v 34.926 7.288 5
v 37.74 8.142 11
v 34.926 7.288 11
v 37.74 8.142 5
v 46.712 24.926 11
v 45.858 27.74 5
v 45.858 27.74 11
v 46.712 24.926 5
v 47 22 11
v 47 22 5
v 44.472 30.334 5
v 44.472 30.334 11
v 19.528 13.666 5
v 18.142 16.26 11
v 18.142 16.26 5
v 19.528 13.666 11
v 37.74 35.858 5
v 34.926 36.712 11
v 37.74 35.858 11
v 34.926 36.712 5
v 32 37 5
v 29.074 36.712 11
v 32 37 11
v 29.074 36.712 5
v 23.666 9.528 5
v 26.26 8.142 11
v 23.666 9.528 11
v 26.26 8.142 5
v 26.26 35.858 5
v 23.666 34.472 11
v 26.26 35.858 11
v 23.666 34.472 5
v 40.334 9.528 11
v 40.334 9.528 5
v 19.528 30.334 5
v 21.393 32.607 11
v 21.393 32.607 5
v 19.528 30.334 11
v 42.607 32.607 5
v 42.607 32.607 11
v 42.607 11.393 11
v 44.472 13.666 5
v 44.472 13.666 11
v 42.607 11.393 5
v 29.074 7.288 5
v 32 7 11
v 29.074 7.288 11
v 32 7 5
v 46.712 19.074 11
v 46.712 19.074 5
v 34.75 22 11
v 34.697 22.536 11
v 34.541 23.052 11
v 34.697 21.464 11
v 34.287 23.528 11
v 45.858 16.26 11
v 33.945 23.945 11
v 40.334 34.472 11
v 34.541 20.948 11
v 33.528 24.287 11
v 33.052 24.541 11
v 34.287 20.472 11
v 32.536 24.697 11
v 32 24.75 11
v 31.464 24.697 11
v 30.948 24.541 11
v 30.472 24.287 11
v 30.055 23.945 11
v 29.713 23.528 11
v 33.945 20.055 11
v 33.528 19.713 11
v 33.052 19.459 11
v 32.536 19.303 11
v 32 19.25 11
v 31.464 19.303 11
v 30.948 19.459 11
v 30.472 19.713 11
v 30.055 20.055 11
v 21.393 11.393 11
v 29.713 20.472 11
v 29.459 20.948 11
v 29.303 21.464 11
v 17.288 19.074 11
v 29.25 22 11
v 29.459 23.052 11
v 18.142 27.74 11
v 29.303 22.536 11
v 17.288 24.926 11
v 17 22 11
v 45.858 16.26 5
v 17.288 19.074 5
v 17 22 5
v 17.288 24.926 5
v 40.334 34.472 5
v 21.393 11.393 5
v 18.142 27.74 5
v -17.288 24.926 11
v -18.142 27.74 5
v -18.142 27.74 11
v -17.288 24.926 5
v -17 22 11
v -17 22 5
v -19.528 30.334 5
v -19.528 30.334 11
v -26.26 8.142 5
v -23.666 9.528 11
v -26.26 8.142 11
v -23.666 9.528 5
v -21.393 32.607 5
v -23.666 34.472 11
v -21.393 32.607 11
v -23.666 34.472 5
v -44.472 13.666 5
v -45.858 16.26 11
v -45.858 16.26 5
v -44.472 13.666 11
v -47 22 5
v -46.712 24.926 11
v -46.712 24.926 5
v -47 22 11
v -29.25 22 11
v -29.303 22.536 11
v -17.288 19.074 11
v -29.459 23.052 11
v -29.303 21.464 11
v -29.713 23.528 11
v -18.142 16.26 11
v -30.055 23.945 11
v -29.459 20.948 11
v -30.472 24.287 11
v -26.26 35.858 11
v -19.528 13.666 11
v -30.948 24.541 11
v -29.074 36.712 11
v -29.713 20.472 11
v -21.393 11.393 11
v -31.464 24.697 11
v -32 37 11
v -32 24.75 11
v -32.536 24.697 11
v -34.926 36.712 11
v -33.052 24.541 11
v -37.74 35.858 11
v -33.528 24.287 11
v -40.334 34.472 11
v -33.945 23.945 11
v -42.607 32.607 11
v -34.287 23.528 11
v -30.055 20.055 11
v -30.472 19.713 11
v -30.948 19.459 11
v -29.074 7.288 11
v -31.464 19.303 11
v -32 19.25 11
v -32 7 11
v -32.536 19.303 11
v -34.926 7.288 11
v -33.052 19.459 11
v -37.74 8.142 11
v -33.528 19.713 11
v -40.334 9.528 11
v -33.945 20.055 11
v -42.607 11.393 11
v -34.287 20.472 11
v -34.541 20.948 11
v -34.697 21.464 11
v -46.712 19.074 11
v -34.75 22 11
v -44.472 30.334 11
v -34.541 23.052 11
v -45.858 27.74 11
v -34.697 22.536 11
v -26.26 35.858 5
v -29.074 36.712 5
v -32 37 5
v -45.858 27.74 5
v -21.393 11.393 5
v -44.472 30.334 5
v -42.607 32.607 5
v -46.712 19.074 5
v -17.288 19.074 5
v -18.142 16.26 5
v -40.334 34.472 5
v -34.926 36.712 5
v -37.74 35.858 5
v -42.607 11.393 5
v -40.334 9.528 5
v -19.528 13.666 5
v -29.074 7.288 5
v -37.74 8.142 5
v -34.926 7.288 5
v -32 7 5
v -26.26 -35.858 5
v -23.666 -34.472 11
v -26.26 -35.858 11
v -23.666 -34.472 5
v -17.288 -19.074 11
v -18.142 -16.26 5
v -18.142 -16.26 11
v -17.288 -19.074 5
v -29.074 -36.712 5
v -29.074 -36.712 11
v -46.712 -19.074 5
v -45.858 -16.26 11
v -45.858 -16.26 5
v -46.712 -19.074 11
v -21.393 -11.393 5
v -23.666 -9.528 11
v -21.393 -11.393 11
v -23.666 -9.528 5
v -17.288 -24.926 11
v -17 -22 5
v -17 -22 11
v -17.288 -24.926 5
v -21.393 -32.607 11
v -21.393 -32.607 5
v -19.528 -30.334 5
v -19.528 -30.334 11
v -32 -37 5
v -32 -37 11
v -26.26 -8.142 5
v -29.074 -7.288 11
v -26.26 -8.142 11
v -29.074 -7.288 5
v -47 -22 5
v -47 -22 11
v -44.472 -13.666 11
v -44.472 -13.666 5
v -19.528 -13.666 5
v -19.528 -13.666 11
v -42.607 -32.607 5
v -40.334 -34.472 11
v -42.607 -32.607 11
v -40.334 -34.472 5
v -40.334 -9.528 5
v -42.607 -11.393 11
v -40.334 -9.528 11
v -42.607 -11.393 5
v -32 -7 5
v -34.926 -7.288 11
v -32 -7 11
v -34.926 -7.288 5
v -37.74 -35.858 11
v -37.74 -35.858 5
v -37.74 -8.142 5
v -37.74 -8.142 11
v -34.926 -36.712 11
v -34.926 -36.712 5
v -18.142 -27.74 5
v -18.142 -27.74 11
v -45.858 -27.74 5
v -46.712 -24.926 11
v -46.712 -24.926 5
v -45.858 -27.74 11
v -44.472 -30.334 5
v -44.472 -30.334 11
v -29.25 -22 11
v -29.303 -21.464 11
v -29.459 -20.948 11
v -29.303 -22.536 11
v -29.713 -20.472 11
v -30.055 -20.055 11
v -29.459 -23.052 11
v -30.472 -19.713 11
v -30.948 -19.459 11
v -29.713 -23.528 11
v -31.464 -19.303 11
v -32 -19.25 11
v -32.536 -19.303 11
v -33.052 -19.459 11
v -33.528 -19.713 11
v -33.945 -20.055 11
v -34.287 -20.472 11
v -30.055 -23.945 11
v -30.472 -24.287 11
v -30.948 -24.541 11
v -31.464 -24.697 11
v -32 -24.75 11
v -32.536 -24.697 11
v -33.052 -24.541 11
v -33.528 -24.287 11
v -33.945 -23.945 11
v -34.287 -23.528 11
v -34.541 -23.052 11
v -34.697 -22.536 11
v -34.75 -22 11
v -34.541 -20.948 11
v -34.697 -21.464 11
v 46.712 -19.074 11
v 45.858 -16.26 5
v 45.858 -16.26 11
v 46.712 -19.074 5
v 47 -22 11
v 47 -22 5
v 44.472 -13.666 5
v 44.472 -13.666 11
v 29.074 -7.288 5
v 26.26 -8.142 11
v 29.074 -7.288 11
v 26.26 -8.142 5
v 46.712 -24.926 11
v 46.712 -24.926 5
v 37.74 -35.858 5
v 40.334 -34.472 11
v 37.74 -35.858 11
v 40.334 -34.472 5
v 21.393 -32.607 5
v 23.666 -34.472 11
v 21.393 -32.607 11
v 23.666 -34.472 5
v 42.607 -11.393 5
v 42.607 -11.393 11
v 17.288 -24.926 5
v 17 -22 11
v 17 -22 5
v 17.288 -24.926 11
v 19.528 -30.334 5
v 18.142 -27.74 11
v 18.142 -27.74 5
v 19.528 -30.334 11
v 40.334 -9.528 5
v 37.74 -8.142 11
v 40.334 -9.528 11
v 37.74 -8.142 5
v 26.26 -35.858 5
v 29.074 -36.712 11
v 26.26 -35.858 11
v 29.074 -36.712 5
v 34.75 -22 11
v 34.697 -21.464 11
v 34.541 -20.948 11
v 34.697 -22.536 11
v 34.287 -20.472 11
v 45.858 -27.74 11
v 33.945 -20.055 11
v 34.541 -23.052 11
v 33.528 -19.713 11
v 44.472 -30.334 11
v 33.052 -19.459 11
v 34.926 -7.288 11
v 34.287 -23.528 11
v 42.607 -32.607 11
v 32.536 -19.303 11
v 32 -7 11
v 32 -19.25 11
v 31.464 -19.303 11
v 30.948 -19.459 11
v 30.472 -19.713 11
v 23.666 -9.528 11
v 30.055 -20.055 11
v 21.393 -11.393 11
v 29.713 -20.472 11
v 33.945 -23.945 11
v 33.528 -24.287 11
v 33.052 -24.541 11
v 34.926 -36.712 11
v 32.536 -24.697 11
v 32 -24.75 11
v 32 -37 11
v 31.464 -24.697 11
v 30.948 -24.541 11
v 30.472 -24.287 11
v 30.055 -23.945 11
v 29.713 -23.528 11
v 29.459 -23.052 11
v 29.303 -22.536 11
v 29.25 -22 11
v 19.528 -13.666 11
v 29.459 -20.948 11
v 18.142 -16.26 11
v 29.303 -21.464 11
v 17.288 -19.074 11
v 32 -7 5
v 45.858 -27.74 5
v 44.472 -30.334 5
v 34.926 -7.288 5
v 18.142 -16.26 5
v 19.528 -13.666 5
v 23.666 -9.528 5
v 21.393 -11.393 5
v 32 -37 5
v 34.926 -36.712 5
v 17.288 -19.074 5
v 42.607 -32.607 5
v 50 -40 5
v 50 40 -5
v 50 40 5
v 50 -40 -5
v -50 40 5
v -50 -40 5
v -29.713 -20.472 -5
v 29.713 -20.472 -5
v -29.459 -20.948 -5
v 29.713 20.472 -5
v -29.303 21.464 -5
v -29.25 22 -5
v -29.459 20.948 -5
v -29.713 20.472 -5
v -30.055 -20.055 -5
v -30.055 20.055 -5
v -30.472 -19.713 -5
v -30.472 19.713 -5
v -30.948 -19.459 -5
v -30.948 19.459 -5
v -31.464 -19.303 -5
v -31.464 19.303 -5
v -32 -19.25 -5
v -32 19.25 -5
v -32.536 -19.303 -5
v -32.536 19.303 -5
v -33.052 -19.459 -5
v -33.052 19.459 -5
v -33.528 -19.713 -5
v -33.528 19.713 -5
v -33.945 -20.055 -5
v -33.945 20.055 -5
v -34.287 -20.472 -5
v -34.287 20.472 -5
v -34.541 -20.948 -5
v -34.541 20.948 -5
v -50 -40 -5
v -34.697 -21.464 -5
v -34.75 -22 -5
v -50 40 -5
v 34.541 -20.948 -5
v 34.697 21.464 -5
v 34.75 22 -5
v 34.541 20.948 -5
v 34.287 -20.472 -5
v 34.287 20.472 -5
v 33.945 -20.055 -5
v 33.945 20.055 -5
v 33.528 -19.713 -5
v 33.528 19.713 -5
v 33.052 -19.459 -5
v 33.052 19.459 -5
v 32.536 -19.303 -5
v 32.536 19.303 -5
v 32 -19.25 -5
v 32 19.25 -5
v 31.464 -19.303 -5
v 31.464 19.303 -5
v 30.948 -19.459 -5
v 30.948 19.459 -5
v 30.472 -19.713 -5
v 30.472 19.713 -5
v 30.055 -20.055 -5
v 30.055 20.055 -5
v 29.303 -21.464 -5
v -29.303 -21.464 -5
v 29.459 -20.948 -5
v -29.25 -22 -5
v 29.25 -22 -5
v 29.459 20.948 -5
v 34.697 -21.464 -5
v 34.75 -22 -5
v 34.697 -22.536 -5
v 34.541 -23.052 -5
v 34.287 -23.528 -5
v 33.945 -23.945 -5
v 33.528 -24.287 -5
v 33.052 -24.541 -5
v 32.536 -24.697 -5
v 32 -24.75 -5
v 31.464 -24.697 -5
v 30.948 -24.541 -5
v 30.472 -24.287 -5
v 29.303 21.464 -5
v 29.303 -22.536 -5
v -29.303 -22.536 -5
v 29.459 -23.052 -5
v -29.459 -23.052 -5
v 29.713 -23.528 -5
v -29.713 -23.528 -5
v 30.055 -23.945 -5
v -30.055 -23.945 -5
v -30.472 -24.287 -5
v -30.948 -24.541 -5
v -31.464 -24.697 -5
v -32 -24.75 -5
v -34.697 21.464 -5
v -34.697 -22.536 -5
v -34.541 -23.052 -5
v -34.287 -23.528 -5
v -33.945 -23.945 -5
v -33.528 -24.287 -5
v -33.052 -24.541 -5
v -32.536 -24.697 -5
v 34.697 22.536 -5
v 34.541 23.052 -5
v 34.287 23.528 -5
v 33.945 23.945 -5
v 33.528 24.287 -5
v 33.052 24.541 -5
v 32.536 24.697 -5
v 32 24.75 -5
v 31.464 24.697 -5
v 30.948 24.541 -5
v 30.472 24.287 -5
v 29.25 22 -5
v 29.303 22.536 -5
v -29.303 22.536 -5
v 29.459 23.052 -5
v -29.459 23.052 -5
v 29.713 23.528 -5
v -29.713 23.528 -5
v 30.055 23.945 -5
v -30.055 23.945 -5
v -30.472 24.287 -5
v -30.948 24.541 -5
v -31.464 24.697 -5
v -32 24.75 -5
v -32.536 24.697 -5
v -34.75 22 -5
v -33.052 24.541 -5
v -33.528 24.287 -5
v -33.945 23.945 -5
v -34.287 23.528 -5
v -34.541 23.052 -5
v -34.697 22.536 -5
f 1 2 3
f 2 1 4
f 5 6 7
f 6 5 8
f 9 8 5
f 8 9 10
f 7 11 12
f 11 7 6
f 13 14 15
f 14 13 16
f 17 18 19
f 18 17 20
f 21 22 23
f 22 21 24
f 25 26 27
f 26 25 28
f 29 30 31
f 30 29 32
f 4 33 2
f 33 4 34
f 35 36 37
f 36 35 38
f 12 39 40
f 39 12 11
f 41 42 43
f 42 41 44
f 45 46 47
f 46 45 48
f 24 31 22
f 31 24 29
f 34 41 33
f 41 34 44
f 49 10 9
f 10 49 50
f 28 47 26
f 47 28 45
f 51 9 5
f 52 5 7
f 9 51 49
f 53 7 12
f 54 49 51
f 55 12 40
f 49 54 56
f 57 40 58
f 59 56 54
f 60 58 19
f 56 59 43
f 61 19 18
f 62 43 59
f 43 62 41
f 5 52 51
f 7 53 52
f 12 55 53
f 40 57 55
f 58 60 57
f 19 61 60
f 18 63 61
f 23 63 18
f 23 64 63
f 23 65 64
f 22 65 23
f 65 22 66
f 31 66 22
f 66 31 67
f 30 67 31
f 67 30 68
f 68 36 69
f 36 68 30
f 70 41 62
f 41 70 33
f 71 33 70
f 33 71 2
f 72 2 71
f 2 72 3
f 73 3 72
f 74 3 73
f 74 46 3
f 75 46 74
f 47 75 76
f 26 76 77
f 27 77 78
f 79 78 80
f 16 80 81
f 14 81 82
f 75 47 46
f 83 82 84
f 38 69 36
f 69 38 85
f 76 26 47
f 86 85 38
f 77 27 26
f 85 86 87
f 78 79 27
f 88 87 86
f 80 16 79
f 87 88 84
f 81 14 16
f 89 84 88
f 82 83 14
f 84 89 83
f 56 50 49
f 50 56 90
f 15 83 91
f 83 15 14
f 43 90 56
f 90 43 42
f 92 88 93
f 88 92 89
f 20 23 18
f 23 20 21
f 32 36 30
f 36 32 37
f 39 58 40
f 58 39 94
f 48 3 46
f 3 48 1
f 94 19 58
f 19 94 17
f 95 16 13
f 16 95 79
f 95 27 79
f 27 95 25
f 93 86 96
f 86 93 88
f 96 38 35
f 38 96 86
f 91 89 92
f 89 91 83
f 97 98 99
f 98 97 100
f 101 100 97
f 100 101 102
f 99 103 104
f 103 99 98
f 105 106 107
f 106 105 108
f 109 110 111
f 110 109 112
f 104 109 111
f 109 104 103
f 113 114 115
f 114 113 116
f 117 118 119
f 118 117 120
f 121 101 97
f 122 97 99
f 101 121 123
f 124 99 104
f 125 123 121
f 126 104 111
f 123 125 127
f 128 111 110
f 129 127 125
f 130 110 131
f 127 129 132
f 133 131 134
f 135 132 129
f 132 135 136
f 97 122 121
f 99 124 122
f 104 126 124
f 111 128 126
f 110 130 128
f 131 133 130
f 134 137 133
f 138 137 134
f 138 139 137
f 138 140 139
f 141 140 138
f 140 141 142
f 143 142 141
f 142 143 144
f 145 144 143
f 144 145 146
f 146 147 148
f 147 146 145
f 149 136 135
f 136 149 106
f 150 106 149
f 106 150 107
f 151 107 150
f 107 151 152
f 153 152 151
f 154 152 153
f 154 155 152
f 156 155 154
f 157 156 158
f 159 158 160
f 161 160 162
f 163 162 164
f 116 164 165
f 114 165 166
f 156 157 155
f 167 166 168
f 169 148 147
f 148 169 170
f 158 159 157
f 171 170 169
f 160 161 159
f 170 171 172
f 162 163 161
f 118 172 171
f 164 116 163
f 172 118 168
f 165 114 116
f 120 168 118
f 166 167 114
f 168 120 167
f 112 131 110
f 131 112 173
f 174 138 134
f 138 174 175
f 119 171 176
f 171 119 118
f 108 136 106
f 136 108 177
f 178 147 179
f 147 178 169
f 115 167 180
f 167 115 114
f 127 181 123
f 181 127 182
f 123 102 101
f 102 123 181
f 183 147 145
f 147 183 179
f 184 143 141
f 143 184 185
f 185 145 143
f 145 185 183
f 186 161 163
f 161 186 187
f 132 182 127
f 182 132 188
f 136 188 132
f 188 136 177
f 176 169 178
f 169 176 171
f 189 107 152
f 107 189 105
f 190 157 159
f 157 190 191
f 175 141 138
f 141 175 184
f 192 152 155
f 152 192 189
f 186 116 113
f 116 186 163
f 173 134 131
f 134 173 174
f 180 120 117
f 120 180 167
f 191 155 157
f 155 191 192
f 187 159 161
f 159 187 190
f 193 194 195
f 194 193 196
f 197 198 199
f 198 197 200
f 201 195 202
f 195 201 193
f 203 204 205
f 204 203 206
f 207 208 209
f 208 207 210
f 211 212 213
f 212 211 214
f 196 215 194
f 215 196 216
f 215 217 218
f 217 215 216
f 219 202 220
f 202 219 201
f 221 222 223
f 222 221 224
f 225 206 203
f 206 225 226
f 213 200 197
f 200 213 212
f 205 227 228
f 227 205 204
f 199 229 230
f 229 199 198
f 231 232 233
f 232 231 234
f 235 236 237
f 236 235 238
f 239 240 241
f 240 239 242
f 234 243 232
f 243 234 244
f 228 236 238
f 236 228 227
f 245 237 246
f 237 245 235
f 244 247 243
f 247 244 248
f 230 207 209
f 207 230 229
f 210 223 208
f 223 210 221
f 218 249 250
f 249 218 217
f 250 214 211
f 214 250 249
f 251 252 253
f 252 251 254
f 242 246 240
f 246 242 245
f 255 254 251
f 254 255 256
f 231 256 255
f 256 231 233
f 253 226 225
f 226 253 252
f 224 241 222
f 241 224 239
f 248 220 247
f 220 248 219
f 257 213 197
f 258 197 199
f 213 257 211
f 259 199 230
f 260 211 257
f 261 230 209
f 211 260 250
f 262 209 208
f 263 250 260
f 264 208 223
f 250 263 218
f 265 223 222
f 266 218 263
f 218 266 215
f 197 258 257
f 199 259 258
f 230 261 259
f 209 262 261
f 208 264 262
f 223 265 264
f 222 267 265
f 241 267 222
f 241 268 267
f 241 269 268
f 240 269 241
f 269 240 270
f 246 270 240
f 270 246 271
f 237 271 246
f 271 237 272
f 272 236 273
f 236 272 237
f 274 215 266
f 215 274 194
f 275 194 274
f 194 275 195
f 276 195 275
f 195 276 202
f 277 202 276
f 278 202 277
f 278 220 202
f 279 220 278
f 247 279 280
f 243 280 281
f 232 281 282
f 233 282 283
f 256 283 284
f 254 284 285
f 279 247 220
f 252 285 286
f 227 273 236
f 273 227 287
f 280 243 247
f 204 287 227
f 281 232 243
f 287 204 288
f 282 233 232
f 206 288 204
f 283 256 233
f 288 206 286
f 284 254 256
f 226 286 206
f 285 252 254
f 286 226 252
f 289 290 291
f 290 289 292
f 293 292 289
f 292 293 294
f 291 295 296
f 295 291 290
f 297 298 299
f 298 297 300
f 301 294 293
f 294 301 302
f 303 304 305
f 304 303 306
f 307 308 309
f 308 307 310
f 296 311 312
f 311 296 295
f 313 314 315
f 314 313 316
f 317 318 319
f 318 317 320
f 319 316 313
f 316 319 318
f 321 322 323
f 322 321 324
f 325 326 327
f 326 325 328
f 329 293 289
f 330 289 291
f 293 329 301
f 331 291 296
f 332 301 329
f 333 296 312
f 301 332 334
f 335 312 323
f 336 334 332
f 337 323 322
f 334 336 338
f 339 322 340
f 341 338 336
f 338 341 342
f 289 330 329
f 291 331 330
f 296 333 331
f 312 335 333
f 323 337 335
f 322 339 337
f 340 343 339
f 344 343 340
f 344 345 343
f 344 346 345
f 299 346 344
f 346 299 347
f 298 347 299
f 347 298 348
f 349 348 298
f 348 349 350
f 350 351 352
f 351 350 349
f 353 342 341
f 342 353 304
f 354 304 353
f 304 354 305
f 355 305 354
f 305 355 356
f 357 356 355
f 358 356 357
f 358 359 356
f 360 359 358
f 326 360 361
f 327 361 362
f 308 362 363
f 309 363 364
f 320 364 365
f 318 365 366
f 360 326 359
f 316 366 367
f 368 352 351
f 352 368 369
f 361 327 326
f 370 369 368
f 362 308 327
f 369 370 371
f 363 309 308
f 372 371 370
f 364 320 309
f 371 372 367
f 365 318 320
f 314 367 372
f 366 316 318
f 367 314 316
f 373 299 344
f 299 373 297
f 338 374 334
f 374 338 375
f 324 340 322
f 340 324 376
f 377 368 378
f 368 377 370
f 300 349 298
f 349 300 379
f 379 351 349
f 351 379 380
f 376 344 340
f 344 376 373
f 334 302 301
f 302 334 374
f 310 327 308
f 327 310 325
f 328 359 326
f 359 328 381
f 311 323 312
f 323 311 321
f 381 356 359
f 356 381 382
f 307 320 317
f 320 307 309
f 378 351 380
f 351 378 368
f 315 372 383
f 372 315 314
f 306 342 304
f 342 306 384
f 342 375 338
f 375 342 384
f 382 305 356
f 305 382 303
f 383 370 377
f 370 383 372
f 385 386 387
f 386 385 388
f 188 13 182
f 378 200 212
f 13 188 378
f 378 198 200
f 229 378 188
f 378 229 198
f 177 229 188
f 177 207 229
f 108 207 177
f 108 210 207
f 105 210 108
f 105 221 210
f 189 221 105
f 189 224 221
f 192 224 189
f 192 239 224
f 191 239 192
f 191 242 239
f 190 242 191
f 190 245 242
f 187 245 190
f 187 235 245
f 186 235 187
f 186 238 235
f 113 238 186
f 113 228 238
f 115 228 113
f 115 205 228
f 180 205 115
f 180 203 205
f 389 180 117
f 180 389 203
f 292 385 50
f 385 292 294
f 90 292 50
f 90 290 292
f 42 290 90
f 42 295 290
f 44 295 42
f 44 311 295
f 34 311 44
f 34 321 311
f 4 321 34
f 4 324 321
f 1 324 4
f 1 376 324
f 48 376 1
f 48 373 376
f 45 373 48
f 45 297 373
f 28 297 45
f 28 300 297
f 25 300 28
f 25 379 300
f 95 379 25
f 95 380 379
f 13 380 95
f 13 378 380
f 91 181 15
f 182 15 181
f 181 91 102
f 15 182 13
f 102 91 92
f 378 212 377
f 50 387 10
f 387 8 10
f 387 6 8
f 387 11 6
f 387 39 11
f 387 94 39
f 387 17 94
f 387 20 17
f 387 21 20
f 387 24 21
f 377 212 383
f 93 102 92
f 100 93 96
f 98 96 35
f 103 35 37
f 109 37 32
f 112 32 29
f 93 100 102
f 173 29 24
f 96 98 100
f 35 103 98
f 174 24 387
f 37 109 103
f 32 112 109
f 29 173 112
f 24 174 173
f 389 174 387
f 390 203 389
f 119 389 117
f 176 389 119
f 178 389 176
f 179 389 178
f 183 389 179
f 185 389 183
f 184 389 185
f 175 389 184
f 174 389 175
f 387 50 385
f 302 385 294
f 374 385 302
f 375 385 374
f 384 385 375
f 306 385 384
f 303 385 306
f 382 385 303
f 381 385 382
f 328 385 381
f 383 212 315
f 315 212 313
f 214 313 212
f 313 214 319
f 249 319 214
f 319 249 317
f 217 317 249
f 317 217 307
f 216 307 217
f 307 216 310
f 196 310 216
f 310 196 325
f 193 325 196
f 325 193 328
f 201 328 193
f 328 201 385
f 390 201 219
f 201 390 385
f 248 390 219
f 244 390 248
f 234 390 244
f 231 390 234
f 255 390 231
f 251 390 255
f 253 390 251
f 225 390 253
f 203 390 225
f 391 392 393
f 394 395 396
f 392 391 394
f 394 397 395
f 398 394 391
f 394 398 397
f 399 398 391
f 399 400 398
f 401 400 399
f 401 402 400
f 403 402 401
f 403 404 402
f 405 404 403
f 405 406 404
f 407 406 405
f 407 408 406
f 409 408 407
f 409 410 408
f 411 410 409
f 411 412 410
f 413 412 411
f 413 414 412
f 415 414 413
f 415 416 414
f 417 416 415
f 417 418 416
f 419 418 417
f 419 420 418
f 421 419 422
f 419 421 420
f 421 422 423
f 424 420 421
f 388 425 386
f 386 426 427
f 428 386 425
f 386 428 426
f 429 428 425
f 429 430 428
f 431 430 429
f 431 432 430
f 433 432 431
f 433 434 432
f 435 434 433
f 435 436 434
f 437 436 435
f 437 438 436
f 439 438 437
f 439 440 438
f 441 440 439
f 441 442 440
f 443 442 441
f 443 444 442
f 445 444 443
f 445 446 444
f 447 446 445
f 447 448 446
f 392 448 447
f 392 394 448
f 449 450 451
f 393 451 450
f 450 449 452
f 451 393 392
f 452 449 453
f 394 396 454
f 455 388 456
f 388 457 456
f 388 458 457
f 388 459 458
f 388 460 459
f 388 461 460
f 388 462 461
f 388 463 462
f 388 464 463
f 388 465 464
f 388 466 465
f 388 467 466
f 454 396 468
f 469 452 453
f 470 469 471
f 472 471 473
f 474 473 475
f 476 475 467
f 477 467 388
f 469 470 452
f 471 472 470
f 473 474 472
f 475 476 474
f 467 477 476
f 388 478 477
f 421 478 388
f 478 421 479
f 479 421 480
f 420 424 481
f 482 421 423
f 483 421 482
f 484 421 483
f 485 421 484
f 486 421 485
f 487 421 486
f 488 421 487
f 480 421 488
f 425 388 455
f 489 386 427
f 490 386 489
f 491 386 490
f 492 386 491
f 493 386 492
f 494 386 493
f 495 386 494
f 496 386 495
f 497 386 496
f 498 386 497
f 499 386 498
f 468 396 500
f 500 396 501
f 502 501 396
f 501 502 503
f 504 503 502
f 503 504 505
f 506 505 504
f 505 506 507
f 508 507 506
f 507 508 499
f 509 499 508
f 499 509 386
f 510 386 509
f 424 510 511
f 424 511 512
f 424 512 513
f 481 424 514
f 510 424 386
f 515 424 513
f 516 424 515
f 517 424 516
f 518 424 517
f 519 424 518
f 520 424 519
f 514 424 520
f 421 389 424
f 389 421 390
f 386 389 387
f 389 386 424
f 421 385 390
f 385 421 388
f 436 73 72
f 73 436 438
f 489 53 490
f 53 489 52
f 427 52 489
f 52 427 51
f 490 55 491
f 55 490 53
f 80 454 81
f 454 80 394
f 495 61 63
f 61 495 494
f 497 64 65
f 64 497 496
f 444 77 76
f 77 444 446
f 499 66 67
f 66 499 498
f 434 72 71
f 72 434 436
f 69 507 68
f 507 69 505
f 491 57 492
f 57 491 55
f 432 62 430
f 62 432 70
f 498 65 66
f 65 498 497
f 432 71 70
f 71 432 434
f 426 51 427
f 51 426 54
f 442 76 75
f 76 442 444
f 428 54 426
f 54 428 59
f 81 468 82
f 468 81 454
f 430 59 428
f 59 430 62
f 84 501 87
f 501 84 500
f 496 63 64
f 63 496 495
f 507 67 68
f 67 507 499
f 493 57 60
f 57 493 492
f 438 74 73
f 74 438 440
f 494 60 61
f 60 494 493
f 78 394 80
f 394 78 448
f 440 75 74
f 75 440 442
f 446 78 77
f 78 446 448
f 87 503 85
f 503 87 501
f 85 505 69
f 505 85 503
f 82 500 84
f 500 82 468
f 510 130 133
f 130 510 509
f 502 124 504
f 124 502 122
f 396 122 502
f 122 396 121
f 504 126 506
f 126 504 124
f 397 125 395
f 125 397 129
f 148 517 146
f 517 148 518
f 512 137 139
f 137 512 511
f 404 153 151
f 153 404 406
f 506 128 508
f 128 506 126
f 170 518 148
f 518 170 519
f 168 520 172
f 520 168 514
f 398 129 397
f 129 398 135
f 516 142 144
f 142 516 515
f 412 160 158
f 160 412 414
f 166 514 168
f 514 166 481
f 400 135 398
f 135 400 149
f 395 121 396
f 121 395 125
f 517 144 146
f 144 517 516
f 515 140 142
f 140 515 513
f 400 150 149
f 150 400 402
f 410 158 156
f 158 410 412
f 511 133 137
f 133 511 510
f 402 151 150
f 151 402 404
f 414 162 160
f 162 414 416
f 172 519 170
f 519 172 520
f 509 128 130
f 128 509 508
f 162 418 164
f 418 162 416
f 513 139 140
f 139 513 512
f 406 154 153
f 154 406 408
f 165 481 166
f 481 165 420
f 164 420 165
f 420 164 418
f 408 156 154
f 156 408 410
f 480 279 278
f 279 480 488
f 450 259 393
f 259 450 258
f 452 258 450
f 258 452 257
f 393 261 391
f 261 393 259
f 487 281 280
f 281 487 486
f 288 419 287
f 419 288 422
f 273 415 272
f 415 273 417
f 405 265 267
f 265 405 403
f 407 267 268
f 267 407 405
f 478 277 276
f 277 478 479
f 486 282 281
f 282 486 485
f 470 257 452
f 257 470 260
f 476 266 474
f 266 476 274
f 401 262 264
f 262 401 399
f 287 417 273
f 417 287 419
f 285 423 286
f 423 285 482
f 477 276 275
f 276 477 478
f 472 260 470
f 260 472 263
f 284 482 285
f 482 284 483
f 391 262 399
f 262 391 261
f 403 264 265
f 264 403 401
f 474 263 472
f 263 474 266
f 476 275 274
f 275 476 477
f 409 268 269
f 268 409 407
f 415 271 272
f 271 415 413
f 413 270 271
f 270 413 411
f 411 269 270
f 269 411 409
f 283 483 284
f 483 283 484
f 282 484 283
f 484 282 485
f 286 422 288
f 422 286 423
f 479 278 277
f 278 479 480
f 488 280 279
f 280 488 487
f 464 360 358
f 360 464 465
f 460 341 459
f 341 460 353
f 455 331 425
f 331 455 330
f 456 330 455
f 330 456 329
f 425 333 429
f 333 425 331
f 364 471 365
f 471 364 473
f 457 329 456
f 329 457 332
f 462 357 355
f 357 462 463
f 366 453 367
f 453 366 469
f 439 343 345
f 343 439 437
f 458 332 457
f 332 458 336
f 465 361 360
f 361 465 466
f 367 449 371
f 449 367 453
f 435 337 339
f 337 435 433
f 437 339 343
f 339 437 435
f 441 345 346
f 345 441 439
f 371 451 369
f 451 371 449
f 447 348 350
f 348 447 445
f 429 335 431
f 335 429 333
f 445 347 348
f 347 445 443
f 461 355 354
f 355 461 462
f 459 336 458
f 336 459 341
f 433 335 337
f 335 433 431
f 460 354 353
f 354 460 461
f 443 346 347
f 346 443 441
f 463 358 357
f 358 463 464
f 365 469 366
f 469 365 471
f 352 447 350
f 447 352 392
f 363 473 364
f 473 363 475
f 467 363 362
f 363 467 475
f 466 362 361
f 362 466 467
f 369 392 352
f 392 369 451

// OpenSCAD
$fn = 32;

// ----------------------------------------------------------------------
// Anchor pads 100 x 80 x 16
// four corner bosses with anchor holes
// ----------------------------------------------------------------------

// --- parameters (mm) ---
plate = [100, 80, 10];  // base plate size (x, y, z)
pads = 4;               // boss count, one per corner
edge = 18;              // boss centre offset from the plate edge
boss_d = 30;            // boss diameter
boss_h = 6;             // boss height above the base plate
hole_d = 5.5;           // hole diameter

// --- derived feature positions (mm) ---
height = plate[2] + boss_h;      // = 16   overall height of the part
corner_x = plate[0] / 2 - edge;  // = 32   boss centre X
corner_y = plate[1] / 2 - edge;  // = 22   boss centre Y
feature_centers = [
  [corner_x, corner_y],
  [-corner_x, corner_y],
  [-corner_x, -corner_y],
  [corner_x, -corner_y]
];   // boss centres, anchor holes are drilled there

// base plate, four bosses standing on it, anchor holes all the way through
difference() {
  union() {
    cube(plate, center = true);
    for (centre = feature_centers)
      translate([centre[0], centre[1], plate[2] / 2 - 1])
        cylinder(d = boss_d, h = boss_h + 1);
  }
  for (centre = feature_centers)
    translate([centre[0], centre[1], -height])
      cylinder(d = hole_d, h = 2 * height + 2);  // through boss and plate
}
